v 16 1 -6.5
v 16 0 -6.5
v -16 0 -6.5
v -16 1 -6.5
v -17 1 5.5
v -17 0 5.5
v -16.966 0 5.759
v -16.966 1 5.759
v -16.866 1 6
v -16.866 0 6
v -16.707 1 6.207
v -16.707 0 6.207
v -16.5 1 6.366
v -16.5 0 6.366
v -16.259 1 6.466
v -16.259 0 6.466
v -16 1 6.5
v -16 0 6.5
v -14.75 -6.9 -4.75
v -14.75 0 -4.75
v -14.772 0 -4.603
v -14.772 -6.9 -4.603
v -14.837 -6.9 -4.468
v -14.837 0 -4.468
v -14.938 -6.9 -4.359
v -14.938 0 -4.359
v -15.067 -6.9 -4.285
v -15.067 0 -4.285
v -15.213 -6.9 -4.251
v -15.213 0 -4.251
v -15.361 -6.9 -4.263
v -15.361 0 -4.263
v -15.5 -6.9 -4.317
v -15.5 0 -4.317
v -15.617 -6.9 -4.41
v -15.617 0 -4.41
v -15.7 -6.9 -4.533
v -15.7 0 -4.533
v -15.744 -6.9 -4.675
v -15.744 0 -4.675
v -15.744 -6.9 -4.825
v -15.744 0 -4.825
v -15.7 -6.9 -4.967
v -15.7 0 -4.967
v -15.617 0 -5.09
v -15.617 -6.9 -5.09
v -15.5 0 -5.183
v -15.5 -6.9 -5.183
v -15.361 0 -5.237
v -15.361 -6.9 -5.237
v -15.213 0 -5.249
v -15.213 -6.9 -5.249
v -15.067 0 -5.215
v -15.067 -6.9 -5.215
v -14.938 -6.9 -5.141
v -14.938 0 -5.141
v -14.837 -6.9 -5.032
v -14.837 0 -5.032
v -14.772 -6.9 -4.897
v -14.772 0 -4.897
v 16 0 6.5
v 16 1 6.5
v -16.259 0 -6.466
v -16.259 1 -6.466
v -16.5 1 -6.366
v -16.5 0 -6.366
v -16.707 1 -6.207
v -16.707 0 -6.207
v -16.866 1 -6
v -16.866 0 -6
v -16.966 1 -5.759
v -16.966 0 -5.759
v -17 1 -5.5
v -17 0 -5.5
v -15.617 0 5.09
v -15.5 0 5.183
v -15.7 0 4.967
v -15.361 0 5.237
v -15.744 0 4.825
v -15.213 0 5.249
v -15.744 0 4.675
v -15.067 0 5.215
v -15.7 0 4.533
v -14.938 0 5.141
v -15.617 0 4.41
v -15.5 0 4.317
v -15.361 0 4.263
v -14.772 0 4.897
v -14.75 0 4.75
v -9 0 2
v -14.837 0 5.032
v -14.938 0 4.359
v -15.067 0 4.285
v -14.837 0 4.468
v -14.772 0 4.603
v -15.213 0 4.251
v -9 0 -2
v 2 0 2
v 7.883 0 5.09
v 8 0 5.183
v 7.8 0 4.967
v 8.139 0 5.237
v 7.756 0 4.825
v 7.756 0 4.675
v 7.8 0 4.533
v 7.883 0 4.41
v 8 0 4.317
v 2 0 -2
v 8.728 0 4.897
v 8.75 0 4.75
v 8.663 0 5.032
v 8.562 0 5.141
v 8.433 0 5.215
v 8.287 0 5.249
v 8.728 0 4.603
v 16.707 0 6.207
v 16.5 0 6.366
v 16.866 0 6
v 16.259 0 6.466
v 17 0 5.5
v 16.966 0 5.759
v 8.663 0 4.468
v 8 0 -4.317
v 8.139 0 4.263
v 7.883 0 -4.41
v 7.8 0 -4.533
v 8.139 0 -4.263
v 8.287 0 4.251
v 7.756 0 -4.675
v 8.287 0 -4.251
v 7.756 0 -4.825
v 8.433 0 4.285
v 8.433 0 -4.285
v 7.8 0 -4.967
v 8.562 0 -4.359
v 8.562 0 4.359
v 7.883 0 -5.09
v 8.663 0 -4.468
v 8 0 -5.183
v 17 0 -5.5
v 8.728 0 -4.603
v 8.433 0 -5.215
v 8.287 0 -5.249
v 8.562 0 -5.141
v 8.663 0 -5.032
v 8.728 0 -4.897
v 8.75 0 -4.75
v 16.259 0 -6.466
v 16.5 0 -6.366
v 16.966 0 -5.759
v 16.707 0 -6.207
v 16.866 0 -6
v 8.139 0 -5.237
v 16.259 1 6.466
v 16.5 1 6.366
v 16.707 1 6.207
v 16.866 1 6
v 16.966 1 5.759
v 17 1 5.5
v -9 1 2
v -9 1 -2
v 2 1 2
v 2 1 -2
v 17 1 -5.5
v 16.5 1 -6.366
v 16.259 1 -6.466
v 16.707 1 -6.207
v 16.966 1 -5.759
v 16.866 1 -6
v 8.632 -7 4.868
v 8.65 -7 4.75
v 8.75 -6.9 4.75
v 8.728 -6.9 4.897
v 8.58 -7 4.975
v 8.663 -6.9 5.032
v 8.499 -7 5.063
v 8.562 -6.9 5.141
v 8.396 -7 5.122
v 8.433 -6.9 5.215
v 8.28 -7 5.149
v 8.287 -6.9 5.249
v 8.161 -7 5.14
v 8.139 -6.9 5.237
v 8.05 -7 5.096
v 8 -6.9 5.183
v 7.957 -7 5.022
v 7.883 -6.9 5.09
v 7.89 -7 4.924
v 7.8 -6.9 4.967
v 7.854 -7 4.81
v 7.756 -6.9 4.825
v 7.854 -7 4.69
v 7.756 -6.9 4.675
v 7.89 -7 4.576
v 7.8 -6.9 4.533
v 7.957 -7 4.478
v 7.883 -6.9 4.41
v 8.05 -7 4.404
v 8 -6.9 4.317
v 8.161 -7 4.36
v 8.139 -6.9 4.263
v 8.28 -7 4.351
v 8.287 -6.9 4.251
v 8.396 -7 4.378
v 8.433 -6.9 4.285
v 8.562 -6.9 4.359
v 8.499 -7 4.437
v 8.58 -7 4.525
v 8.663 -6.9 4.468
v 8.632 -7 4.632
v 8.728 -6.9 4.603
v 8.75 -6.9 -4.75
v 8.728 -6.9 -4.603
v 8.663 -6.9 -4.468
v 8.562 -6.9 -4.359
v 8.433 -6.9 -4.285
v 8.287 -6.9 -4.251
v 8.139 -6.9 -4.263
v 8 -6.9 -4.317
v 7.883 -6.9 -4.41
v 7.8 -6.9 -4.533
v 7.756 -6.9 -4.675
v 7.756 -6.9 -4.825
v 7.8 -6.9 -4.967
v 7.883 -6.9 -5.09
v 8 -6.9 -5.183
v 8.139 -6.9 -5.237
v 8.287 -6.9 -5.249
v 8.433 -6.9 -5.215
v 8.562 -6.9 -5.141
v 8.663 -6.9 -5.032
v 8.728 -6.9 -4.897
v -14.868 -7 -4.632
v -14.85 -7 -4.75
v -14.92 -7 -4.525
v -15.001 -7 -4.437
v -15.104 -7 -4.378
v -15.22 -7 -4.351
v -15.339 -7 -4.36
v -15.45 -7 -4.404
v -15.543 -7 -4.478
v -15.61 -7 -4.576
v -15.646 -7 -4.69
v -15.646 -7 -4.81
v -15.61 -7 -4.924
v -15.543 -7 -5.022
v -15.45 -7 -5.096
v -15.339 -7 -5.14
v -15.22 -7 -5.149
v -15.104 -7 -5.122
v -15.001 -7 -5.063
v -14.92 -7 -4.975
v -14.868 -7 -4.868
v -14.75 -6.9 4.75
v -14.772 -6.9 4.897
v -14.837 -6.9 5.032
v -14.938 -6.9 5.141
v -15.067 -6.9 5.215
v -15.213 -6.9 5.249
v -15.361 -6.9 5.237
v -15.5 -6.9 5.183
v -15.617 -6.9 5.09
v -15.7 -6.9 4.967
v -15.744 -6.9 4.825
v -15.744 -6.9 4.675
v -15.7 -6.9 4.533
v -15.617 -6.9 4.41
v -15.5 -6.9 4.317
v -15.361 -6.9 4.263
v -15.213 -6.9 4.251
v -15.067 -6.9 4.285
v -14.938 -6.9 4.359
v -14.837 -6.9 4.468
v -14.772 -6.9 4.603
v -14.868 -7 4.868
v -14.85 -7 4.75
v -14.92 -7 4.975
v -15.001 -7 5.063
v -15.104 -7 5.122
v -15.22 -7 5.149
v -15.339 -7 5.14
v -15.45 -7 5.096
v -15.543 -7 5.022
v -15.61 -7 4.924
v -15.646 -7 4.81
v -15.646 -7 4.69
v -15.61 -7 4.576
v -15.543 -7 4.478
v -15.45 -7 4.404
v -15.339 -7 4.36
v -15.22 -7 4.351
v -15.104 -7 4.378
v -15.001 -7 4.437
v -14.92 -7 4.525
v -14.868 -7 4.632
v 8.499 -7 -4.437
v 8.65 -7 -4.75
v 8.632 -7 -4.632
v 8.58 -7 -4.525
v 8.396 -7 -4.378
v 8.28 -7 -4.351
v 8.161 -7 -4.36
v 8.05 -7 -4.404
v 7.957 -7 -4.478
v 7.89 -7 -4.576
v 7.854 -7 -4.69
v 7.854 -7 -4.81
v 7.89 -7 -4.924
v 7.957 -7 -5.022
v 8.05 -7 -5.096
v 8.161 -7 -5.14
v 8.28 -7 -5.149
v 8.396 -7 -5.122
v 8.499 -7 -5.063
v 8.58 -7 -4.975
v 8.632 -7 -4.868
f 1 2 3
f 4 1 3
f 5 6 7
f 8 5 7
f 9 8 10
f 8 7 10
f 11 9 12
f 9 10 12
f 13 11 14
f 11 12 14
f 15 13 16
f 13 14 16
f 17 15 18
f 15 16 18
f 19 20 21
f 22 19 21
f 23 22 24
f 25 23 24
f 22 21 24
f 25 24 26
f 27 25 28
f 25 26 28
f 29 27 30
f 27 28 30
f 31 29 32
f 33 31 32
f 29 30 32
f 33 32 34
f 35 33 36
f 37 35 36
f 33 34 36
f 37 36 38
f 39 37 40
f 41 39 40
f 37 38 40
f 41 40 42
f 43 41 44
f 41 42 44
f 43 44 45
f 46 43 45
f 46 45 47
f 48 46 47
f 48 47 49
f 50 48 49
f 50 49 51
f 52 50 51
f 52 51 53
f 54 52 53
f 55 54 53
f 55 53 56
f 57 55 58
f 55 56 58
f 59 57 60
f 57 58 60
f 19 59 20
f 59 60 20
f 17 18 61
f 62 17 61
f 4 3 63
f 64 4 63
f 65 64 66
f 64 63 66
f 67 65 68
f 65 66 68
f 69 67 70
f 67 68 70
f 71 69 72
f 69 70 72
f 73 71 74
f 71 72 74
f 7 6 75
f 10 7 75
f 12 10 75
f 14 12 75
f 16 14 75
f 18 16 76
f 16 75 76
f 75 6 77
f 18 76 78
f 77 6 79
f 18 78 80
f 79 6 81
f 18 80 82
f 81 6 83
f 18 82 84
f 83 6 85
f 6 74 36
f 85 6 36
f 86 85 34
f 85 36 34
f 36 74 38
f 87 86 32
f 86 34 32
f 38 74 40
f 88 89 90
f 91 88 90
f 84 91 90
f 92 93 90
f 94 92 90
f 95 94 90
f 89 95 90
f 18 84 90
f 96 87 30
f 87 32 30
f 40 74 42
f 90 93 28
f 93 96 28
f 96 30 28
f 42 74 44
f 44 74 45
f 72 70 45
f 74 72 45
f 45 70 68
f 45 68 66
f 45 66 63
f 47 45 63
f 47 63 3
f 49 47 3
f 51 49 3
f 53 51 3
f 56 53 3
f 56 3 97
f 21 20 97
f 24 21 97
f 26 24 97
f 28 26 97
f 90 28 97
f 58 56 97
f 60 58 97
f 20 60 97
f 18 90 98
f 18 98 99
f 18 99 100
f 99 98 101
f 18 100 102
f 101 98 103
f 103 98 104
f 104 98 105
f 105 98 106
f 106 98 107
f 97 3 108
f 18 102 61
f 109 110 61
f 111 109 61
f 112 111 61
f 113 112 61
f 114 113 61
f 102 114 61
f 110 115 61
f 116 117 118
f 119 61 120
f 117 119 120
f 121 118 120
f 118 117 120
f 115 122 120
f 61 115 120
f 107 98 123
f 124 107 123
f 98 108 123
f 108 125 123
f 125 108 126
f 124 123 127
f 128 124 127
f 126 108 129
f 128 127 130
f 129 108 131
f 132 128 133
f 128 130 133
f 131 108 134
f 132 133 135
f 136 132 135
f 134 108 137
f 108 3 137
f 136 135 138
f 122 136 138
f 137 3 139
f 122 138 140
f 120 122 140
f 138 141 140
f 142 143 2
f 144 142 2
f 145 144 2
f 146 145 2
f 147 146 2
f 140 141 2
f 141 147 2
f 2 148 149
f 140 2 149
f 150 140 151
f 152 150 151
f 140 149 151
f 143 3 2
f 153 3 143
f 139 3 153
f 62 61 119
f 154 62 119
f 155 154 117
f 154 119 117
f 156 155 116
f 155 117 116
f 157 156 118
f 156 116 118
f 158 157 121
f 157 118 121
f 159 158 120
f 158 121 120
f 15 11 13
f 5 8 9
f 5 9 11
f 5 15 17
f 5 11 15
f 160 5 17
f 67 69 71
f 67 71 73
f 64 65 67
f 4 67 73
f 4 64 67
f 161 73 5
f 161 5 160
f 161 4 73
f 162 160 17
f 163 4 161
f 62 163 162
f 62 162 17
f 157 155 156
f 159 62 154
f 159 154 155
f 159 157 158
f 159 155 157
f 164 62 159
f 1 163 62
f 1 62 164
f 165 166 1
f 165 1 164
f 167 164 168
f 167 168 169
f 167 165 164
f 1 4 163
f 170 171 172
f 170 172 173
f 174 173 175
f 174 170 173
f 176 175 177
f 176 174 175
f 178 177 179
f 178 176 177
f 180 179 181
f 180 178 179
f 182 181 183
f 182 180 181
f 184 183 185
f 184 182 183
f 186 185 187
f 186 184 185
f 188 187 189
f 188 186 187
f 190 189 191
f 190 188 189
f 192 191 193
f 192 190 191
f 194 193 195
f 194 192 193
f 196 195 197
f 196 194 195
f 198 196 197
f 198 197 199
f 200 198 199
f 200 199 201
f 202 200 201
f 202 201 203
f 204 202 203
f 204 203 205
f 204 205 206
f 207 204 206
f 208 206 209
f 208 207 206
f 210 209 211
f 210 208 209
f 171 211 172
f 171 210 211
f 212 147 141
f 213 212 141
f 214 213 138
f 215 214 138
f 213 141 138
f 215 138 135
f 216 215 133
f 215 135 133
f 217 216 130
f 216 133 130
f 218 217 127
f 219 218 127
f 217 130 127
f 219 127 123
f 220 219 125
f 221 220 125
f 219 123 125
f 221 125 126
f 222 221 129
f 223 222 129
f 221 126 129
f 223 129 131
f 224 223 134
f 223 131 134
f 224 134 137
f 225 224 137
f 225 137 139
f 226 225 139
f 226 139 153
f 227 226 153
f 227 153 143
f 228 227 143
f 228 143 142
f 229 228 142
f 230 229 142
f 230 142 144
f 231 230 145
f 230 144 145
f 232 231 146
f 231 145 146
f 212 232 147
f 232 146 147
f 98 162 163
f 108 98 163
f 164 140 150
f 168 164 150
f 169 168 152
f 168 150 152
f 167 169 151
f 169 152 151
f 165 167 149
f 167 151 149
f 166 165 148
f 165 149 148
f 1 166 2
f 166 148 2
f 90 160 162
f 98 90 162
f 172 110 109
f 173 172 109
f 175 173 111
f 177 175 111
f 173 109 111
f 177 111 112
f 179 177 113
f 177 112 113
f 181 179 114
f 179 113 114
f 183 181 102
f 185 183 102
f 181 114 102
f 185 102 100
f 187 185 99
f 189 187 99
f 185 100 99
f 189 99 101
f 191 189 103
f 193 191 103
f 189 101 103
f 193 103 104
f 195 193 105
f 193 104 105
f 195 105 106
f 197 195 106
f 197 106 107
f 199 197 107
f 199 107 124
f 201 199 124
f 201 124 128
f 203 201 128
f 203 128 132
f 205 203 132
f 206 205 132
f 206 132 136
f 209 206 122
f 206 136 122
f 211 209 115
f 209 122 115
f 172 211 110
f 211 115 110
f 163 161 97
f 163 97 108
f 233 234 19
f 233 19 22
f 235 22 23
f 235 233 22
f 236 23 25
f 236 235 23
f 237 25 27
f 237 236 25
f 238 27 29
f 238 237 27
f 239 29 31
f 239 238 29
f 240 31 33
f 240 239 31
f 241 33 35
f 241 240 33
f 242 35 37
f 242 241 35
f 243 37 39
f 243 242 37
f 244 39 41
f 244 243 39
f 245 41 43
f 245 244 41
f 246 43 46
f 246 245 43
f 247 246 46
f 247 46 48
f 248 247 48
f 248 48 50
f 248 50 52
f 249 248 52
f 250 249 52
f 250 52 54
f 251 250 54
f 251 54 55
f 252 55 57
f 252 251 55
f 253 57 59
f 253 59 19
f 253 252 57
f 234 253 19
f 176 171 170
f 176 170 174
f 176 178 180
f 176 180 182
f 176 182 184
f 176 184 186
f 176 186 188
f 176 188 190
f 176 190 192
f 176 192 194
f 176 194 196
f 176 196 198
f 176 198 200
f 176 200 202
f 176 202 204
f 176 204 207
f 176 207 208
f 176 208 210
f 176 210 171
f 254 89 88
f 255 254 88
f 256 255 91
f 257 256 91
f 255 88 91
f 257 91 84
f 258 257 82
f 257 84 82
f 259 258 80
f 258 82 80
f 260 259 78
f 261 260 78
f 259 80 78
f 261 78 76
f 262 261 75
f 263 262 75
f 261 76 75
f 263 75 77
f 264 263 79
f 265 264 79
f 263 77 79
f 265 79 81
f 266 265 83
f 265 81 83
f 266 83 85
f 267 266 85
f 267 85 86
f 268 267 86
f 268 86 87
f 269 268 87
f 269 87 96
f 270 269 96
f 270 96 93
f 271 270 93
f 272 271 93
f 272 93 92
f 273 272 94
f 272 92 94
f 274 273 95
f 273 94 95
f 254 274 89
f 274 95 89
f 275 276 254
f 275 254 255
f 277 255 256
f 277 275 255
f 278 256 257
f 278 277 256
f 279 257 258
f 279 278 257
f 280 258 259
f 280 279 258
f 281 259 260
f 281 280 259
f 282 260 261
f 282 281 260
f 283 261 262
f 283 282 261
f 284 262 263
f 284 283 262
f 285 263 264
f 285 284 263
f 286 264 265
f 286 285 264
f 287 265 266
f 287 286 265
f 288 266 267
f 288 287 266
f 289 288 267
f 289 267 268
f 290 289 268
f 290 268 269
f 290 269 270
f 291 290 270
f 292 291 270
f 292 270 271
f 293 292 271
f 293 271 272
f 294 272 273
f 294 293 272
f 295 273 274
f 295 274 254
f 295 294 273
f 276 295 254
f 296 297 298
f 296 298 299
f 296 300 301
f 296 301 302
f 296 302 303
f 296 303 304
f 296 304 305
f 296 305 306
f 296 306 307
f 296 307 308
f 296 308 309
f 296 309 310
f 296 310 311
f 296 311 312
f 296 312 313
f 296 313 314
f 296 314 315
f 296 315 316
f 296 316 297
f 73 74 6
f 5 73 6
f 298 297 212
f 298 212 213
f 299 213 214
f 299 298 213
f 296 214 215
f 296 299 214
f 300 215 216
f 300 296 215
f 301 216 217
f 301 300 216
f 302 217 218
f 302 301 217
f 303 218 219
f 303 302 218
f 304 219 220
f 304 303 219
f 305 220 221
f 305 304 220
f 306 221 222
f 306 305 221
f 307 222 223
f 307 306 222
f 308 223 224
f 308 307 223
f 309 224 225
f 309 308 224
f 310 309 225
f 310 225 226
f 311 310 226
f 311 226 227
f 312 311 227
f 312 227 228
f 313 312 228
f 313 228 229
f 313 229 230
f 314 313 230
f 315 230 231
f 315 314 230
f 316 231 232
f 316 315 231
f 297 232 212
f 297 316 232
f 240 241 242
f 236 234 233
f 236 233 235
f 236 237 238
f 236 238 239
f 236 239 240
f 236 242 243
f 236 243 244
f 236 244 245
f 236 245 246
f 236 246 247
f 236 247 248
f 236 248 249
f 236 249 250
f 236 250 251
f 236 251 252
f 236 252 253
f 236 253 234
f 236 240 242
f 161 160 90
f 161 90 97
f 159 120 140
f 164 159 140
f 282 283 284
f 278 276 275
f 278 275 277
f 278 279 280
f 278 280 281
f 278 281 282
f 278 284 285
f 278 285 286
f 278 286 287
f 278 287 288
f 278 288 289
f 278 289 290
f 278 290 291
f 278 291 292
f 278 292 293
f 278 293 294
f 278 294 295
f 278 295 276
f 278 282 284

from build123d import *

# Parameters (mm, degrees)
BOSS_EXTRUDE1_DEPTH     = 1
SKETCH2_R               = 0.5
BOSS_EXTRUDE2_DEPTH     = 7
SKETCH4_W               = 11
SKETCH4_H               = 4
CUT_EXTRUDE1_DEPTH      = 1
CUT_EXTRUDE1_DEPTH_BACK = 9
CHAMFER2_SIZE           = 0.1


with BuildPart() as part:
    # Sketch1 → Boss-Extrude1 (new body)
    with BuildSketch(Plane(origin=(0, 0, 0), x_dir=(1, 0, 0), z_dir=(0, 1, 0))):
        with BuildLine():
            Line((-16, -6.5), (16, -6.5))
            ThreePointArc((16, -6.5), (16.707106781, -6.207106781), (17, -5.5))
            Line((17, -5.5), (17, 5.5))
            ThreePointArc((17, 5.5), (16.707106781, 6.207106781), (16, 6.5))
            Line((16, 6.5), (-16, 6.5))
            ThreePointArc((-16, 6.5), (-16.707106781, 6.207106781), (-17, 5.5))
            Line((-17, 5.5), (-17, -5.5))
            ThreePointArc((-17, -5.5), (-16.707106781, -6.207106781), (-16, -6.5))
        make_face()
    extrude(amount=BOSS_EXTRUDE1_DEPTH)

    # Sketch2 → Boss-Extrude2 (add)
    with BuildSketch(Plane.XZ):
        with Locations((-15.25, 4.75)):
            Circle(SKETCH2_R)
        with Locations((-15.25, -4.75)):
            Circle(SKETCH2_R)
        with Locations((8.25, -4.75)):
            Circle(SKETCH2_R)
        with Locations((8.25, 4.75)):
            Circle(SKETCH2_R)
    extrude(amount=BOSS_EXTRUDE2_DEPTH)

    # Sketch4 → Cut-Extrude1 (cut, two sides)
    with BuildSketch(Plane(origin=(0, 1, 0), x_dir=(1, 0, 0), z_dir=(0, 1, 0))) as cut_extrude1_sk:
        with Locations((-3.5, 0)):
            Rectangle(SKETCH4_W, SKETCH4_H)
    extrude(amount=CUT_EXTRUDE1_DEPTH, mode=Mode.SUBTRACT)
    extrude(cut_extrude1_sk.sketch, amount=-CUT_EXTRUDE1_DEPTH_BACK, mode=Mode.SUBTRACT)

    # Chamfer2
    chamfer2_edges = [part.edges().sort_by_distance(p)[0] for p in [
        (-15.75, -7, 4.75),
        (7.75, -7, 4.75),
        (7.75, -7, -4.75),
        (-15.75, -7, -4.75),
    ]]
    chamfer(chamfer2_edges, length=CHAMFER2_SIZE)


solid = part.part
